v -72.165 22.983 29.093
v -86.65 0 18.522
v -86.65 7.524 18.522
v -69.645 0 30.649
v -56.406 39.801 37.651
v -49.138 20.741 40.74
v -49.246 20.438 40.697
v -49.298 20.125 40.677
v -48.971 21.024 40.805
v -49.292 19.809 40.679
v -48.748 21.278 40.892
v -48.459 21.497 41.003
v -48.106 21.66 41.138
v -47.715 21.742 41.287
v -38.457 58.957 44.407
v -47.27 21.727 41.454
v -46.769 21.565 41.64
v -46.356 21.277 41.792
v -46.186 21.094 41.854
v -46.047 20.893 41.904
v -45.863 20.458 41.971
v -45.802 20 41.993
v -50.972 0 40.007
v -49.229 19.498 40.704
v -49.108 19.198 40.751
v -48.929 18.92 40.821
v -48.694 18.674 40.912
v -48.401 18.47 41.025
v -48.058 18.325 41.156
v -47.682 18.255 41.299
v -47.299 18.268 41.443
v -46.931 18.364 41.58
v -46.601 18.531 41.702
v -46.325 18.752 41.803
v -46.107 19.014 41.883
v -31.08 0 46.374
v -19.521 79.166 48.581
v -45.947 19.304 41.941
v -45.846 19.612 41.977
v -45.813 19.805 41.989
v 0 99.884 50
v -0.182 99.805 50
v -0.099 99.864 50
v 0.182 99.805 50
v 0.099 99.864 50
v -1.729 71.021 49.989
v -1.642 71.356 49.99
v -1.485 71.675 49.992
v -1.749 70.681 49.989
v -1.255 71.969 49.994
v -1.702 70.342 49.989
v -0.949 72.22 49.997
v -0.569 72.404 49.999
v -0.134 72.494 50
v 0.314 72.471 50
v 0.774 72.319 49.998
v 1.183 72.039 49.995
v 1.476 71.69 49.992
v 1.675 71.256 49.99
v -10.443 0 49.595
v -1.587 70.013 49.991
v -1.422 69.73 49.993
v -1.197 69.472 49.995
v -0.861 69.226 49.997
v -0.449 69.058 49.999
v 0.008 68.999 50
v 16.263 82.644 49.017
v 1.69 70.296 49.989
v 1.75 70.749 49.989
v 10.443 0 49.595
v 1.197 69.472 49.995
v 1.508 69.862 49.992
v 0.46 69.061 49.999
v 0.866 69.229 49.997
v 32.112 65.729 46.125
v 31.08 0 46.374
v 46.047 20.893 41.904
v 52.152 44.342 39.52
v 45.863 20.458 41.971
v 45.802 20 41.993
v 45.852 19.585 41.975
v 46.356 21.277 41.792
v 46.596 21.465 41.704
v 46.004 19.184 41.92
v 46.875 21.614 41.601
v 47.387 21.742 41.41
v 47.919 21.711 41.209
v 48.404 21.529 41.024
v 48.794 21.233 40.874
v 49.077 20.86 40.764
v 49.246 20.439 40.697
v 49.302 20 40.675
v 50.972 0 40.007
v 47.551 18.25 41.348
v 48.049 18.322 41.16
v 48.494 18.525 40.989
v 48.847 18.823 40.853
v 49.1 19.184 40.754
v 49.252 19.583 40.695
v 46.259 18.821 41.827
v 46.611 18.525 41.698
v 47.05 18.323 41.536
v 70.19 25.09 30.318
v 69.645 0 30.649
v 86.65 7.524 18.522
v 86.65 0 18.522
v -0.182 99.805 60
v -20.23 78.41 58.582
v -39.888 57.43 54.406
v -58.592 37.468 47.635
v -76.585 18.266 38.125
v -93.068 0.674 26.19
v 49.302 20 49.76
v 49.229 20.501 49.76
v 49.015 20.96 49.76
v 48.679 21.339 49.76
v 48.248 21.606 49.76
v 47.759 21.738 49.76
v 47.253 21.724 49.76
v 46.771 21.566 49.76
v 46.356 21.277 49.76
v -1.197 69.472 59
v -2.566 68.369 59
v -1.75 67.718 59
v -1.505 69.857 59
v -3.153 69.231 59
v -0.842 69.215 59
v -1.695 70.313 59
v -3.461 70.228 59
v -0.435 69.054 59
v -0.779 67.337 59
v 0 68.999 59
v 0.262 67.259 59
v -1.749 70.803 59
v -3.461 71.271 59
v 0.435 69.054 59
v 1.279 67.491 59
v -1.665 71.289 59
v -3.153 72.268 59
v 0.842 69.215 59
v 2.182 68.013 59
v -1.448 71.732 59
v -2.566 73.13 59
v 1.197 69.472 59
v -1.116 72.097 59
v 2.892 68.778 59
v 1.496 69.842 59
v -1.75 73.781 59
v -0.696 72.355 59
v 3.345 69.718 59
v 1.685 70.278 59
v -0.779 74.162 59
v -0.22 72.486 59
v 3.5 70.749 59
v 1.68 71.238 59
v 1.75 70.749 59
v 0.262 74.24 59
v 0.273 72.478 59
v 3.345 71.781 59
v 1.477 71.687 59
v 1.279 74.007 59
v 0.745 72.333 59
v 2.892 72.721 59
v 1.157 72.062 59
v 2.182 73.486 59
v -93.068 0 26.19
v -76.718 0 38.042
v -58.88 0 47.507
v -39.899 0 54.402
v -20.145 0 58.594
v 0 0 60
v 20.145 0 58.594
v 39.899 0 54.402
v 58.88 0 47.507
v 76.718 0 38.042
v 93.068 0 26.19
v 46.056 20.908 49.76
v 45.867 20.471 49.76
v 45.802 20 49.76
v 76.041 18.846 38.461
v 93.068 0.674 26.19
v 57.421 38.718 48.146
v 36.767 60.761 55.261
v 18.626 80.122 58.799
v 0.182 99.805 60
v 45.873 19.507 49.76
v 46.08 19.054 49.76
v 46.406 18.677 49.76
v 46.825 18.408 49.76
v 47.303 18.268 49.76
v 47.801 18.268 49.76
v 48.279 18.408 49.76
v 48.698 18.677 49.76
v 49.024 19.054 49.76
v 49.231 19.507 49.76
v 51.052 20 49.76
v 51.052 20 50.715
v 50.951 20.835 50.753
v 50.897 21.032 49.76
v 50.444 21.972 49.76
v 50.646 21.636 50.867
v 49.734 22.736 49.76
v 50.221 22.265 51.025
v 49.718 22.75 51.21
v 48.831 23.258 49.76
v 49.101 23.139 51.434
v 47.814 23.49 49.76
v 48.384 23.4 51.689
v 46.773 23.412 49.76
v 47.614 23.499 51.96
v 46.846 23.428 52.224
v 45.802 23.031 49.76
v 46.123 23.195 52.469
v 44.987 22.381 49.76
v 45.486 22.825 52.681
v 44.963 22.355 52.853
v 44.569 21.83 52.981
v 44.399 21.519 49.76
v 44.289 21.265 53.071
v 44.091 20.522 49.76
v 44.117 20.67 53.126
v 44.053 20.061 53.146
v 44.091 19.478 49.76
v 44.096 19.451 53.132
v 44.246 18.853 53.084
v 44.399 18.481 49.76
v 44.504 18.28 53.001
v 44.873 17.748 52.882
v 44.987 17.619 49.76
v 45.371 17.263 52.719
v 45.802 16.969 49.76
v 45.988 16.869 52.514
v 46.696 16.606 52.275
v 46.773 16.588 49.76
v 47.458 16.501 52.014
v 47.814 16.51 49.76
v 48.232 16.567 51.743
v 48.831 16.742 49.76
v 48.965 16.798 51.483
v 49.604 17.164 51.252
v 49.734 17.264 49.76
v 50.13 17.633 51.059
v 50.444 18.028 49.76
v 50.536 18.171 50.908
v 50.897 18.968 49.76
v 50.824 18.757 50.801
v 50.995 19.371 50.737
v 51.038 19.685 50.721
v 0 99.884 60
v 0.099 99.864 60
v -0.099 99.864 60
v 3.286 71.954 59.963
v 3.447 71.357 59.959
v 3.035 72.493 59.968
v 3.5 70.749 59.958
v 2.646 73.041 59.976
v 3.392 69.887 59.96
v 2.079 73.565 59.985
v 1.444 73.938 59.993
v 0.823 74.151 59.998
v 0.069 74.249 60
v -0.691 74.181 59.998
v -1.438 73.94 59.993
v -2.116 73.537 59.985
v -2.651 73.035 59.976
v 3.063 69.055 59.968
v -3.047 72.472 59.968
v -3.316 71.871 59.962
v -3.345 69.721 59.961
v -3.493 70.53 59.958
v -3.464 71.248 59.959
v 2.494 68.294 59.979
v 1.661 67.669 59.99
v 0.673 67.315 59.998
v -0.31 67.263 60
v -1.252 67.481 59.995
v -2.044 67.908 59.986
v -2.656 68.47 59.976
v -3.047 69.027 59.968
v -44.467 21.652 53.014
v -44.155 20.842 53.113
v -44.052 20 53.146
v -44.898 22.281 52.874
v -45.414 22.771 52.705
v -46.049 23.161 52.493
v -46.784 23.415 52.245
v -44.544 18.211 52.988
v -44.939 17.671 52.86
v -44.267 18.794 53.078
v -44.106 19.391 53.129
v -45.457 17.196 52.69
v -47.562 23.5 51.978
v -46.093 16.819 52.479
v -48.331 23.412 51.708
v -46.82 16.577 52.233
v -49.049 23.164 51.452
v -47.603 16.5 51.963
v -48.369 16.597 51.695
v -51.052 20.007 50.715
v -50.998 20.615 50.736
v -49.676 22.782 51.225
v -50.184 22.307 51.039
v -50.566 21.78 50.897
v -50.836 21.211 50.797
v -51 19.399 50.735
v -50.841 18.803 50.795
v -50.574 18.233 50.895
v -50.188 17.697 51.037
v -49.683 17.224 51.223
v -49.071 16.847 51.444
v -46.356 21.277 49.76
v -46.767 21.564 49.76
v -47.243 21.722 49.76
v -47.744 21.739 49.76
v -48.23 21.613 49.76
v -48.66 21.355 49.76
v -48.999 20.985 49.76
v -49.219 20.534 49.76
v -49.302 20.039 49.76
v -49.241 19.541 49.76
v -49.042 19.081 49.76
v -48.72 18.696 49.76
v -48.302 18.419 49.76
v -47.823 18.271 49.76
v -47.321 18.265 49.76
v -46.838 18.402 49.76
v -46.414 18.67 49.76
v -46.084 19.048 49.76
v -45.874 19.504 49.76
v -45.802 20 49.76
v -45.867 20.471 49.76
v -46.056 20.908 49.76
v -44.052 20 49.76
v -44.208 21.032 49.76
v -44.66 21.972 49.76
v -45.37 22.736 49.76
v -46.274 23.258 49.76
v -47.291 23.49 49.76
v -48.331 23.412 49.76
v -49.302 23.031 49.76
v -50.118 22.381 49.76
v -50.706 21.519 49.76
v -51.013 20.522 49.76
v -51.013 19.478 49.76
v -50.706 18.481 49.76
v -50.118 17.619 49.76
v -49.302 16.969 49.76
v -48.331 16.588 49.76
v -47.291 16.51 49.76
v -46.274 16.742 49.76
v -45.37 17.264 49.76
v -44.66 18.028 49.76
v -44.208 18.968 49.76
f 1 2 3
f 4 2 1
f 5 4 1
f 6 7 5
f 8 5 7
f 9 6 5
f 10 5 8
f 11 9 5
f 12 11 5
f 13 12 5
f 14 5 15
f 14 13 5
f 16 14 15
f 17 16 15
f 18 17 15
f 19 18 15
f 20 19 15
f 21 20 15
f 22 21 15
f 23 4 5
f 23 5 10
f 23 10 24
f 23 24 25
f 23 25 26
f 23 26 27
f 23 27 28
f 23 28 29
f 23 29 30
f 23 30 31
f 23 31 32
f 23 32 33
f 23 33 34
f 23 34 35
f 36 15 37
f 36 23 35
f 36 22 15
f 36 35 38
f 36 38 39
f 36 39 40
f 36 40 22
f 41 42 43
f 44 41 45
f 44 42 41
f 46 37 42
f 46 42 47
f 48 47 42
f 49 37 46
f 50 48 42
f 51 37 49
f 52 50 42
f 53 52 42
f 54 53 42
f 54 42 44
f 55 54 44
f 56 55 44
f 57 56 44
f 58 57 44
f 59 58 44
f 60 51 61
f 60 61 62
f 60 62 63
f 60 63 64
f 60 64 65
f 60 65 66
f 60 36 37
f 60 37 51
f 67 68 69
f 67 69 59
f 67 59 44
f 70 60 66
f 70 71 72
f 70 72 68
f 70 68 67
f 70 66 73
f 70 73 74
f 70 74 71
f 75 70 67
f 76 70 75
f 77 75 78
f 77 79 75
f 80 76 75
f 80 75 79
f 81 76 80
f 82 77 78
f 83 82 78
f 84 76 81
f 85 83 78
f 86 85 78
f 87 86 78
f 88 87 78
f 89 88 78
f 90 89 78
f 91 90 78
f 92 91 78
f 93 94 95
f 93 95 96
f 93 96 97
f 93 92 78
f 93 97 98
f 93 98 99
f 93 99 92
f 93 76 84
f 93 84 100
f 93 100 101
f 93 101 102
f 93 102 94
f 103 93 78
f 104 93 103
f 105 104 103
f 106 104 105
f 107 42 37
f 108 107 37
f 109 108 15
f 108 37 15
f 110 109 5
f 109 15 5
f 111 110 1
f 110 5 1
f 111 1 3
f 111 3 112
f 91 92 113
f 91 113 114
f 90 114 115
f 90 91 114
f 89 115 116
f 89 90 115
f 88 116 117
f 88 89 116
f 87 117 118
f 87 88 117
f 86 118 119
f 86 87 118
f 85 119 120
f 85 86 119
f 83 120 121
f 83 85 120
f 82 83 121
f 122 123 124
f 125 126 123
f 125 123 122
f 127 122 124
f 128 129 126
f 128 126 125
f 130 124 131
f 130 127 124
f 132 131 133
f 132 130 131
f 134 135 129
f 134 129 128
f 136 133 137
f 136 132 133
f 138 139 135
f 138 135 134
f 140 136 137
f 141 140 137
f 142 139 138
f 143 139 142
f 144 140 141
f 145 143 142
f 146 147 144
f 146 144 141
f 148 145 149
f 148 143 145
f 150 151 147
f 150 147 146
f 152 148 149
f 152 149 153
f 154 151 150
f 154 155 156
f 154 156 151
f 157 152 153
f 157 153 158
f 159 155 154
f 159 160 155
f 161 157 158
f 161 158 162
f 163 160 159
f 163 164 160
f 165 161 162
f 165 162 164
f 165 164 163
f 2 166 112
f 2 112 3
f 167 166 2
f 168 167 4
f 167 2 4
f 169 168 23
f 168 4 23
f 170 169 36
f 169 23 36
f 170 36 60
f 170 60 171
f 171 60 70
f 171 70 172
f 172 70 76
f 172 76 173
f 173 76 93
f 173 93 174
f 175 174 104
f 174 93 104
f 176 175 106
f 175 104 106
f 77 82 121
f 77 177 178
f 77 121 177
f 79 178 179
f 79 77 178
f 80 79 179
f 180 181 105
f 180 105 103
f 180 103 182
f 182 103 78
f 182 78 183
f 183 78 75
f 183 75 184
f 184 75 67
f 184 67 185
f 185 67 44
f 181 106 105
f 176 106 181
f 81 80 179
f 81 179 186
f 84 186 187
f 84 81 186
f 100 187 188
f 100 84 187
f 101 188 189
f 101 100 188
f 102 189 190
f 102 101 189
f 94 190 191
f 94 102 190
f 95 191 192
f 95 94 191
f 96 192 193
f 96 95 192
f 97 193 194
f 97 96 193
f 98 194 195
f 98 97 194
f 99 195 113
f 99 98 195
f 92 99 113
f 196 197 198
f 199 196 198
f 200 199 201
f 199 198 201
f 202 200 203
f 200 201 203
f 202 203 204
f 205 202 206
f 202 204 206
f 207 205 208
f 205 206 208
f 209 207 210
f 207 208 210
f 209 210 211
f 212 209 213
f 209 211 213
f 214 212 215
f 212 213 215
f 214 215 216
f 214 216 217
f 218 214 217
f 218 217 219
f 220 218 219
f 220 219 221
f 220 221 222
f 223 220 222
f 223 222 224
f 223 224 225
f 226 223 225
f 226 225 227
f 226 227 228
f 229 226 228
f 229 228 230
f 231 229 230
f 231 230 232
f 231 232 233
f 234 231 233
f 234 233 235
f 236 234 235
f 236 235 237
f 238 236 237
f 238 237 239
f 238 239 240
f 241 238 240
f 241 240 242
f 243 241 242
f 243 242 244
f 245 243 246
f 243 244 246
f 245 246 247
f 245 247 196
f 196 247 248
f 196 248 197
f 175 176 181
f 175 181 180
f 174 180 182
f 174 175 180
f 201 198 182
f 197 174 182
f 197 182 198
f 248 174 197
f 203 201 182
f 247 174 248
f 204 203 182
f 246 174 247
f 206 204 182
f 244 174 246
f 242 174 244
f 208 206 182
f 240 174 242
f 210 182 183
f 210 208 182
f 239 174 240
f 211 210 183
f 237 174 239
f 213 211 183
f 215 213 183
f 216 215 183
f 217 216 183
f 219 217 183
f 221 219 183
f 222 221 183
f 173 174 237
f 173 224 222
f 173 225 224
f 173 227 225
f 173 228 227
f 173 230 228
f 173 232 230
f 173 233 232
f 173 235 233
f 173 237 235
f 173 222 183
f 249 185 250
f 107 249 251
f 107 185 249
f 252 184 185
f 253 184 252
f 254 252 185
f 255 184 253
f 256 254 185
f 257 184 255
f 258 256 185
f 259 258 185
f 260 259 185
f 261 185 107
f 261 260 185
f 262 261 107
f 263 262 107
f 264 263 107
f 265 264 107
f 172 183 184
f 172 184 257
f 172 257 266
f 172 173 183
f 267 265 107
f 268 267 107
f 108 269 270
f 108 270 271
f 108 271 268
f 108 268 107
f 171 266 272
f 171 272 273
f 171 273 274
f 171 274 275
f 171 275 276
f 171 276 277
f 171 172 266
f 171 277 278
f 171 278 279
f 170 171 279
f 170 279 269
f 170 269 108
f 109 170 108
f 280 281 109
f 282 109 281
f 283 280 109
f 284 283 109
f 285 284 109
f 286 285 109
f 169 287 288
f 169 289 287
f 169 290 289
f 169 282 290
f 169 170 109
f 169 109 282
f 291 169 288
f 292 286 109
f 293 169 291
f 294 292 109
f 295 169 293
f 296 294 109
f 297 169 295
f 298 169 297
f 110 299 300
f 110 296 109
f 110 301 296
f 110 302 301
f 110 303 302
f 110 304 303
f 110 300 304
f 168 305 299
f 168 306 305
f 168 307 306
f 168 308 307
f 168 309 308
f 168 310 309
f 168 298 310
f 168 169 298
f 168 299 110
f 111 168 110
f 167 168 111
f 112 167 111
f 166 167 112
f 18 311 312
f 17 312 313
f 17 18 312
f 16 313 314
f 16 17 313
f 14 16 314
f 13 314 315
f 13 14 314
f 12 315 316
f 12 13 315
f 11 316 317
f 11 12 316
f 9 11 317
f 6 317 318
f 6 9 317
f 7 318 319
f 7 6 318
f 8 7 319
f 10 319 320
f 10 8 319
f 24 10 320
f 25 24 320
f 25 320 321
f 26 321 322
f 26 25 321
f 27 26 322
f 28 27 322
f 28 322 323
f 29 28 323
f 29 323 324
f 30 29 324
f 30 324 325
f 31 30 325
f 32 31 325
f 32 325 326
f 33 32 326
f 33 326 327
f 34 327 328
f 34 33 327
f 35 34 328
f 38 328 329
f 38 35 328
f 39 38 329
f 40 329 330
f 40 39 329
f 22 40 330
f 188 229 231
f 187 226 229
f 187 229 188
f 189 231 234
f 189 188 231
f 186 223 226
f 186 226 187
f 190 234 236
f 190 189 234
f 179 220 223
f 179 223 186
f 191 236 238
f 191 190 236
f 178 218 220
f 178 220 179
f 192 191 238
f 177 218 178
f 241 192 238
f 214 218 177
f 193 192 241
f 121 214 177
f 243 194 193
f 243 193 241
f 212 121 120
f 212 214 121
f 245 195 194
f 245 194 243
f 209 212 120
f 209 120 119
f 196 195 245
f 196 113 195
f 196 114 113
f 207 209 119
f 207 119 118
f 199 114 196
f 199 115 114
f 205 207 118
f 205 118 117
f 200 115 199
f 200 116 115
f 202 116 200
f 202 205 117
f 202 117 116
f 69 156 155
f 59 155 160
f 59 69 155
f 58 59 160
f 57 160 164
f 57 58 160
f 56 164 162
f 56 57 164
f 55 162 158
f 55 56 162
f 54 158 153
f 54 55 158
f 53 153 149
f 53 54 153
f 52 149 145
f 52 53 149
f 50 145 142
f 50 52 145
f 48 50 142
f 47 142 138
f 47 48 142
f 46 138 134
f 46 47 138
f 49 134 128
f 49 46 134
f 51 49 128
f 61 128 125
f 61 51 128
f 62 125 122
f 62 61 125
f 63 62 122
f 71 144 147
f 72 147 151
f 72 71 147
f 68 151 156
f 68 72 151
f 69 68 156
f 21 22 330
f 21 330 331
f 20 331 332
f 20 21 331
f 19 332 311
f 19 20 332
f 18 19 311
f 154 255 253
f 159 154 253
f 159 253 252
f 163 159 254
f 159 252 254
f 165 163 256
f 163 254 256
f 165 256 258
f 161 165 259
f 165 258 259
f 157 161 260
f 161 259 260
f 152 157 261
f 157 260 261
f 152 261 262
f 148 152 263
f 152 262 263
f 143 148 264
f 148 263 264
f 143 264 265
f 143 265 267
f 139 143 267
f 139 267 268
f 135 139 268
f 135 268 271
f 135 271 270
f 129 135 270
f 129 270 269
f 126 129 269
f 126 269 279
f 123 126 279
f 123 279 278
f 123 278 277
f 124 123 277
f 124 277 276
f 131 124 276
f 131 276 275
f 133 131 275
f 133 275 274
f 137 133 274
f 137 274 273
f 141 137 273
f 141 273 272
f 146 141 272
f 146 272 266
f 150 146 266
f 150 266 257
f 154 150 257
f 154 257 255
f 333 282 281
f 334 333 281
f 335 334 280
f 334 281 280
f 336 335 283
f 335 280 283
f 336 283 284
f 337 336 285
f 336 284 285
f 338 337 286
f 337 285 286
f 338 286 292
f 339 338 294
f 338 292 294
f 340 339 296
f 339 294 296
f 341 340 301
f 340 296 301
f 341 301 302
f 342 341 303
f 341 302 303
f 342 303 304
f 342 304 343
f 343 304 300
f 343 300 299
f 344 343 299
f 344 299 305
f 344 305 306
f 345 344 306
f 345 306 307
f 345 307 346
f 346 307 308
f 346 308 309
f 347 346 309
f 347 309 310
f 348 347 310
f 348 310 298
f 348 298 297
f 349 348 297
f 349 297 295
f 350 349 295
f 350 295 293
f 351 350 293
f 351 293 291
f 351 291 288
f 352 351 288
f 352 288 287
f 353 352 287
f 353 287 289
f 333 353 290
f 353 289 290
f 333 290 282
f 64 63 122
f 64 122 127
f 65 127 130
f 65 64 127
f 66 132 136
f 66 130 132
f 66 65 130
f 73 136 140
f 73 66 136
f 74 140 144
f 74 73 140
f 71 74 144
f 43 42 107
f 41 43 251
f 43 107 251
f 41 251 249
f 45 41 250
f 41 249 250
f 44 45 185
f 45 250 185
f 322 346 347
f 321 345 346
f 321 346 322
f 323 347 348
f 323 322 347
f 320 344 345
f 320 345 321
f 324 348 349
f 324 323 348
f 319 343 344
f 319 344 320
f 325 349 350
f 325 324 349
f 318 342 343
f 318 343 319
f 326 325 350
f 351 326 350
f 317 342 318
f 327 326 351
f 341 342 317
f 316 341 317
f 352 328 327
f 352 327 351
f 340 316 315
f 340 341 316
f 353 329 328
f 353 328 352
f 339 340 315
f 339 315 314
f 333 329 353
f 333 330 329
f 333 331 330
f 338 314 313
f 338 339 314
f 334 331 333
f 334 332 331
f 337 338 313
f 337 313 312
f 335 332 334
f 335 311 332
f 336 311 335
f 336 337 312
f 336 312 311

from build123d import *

# Parameters (mm, degrees)
BOSS_EXTRUDE1_DEPTH = 100
CUT_EXTRUDE1_DEPTH  = 100
CUT_EXTRUDE3_DEPTH  = 100
FILLET1_R           = 0.25
CUT_EXTRUDE4_DEPTH  = 100
SKETCH6_R           = 3.5
CUT_EXTRUDE5_DEPTH  = 1
SKETCH7_R           = 3.5
CUT_EXTRUDE6_DEPTH  = 10.24


with BuildPart() as part:
    # Sketch1 → Boss-Extrude1 (new body)
    with BuildSketch(Plane.XY):
        Polygon((-93.7, 0), (93.7, 0), (0, 100), align=None)
    extrude(amount=BOSS_EXTRUDE1_DEPTH)

    # Sketch3 → Cut-Extrude1 (cut)
    with BuildSketch(Plane(origin=(0, 0, 0), x_dir=(1, 0, 0), z_dir=(0, 1, 0))):
        with BuildLine():
            Line((86.649916098, -18.521939898), (93.7, -26.944779698))
            Line((93.7, -26.944779698), (117.286189742, 18.149796591))
            ThreePointArc((117.286189742, 18.149796591), (0, 220), (-117.286189742, 18.149796591))
            Line((-117.286189742, 18.149796591), (-93.7, -26.944779698))
            Line((-93.7, -26.944779698), (-86.649916098, -18.521939898))
            ThreePointArc((-86.649916098, -18.521939898), (0, -50), (86.649916098, -18.521939898))
        make_face()
    extrude(amount=CUT_EXTRUDE1_DEPTH, mode=Mode.SUBTRACT)

    # Sketch4 → Cut-Extrude3 (cut)
    with BuildSketch(Plane(origin=(0, 0, 0), x_dir=(1, 0, 0), z_dir=(0, 1, 0))):
        with BuildLine():
            Line((-145, 85), (-145, -157.27076369))
            Line((-145, -157.27076369), (195.83768652, -157.27076369))
            Line((195.83768652, -157.27076369), (144.517709557, 73.183417402))
            ThreePointArc((144.517709557, 73.183417402), (-5.913210388, -59.879377217), (-145, 85))
        make_face()
    extrude(amount=CUT_EXTRUDE3_DEPTH, mode=Mode.SUBTRACT)

    # Fillet1
    fillet1_edges = [part.edges().sort_by_distance(p)[0] for p in [
        (0, 100, 55),
    ]]
    fillet(fillet1_edges, radius=FILLET1_R)

    # Sketch5 → Cut-Extrude4 (cut)
    with BuildSketch(Plane.XY):
        with BuildLine():
            ThreePointArc((1.75, 70.74941109), (-0.695889742, 72.355100184), (-1.196557105, 69.472402439))
            Line((-1.196557105, 69.472402439), (0, 70.74941109))
            Line((0, 70.74941109), (1.196557105, 69.472402439))
            ThreePointArc((1.196557105, 69.472402439), (1.605689094, 70.053521348), (1.75, 70.74941109))
        make_face()
        with BuildLine():
            Line((0, 70.74941109), (-1.196557105, 69.472402439))
            ThreePointArc((-1.196557105, 69.472402439), (0, 68.99941109), (1.196557105, 69.472402439))
            Line((1.196557105, 69.472402439), (0, 70.74941109))
        make_face()
        with BuildLine():
            ThreePointArc((46.355641086, 21.27700865), (45.946509097, 20.695889742), (45.802198191, 20))
            Line((45.802198191, 20), (47.552198191, 20))
            Line((47.552198191, 20), (46.355641086, 21.27700865))
        make_face()
        with BuildLine():
            Line((47.552198191, 20), (45.802198191, 20))
            ThreePointArc((45.802198191, 20), (47.552198191, 18.25), (49.302198191, 20))
            ThreePointArc((49.302198191, 20), (48.248087933, 21.605689094), (46.355641086, 21.27700865))
            Line((46.355641086, 21.27700865), (47.552198191, 20))
        make_face()
        with BuildLine():
            Line((-46.355641086, 21.27700865), (-47.552198191, 20))
            Line((-47.552198191, 20), (-45.802198191, 20))
            ThreePointArc((-45.802198191, 20), (-45.946509097, 20.695889742), (-46.355641086, 21.27700865))
        make_face()
        with BuildLine():
            Line((-45.802198191, 20), (-47.552198191, 20))
            Line((-47.552198191, 20), (-46.355641086, 21.27700865))
            ThreePointArc((-46.355641086, 21.27700865), (-49.157887285, 19.304110258), (-45.802198191, 20))
        make_face()
    extrude(amount=CUT_EXTRUDE4_DEPTH, mode=Mode.SUBTRACT)

    # Sketch6 → Cut-Extrude5 (cut)
    with BuildSketch(Plane.XY.offset(60)):
        with Locations((0, 70.74941109)):
            Circle(SKETCH6_R)
    extrude(amount=-CUT_EXTRUDE5_DEPTH, mode=Mode.SUBTRACT)

    # Sketch7 → Cut-Extrude6 (cut)
    with BuildSketch(Plane.XY.offset(60)):
        with Locations((-47.552198191, 20)):
            Circle(SKETCH7_R)
        with Locations((47.552198191, 20)):
            Circle(SKETCH7_R)
    extrude(amount=-CUT_EXTRUDE6_DEPTH, mode=Mode.SUBTRACT)


solid = part.part
